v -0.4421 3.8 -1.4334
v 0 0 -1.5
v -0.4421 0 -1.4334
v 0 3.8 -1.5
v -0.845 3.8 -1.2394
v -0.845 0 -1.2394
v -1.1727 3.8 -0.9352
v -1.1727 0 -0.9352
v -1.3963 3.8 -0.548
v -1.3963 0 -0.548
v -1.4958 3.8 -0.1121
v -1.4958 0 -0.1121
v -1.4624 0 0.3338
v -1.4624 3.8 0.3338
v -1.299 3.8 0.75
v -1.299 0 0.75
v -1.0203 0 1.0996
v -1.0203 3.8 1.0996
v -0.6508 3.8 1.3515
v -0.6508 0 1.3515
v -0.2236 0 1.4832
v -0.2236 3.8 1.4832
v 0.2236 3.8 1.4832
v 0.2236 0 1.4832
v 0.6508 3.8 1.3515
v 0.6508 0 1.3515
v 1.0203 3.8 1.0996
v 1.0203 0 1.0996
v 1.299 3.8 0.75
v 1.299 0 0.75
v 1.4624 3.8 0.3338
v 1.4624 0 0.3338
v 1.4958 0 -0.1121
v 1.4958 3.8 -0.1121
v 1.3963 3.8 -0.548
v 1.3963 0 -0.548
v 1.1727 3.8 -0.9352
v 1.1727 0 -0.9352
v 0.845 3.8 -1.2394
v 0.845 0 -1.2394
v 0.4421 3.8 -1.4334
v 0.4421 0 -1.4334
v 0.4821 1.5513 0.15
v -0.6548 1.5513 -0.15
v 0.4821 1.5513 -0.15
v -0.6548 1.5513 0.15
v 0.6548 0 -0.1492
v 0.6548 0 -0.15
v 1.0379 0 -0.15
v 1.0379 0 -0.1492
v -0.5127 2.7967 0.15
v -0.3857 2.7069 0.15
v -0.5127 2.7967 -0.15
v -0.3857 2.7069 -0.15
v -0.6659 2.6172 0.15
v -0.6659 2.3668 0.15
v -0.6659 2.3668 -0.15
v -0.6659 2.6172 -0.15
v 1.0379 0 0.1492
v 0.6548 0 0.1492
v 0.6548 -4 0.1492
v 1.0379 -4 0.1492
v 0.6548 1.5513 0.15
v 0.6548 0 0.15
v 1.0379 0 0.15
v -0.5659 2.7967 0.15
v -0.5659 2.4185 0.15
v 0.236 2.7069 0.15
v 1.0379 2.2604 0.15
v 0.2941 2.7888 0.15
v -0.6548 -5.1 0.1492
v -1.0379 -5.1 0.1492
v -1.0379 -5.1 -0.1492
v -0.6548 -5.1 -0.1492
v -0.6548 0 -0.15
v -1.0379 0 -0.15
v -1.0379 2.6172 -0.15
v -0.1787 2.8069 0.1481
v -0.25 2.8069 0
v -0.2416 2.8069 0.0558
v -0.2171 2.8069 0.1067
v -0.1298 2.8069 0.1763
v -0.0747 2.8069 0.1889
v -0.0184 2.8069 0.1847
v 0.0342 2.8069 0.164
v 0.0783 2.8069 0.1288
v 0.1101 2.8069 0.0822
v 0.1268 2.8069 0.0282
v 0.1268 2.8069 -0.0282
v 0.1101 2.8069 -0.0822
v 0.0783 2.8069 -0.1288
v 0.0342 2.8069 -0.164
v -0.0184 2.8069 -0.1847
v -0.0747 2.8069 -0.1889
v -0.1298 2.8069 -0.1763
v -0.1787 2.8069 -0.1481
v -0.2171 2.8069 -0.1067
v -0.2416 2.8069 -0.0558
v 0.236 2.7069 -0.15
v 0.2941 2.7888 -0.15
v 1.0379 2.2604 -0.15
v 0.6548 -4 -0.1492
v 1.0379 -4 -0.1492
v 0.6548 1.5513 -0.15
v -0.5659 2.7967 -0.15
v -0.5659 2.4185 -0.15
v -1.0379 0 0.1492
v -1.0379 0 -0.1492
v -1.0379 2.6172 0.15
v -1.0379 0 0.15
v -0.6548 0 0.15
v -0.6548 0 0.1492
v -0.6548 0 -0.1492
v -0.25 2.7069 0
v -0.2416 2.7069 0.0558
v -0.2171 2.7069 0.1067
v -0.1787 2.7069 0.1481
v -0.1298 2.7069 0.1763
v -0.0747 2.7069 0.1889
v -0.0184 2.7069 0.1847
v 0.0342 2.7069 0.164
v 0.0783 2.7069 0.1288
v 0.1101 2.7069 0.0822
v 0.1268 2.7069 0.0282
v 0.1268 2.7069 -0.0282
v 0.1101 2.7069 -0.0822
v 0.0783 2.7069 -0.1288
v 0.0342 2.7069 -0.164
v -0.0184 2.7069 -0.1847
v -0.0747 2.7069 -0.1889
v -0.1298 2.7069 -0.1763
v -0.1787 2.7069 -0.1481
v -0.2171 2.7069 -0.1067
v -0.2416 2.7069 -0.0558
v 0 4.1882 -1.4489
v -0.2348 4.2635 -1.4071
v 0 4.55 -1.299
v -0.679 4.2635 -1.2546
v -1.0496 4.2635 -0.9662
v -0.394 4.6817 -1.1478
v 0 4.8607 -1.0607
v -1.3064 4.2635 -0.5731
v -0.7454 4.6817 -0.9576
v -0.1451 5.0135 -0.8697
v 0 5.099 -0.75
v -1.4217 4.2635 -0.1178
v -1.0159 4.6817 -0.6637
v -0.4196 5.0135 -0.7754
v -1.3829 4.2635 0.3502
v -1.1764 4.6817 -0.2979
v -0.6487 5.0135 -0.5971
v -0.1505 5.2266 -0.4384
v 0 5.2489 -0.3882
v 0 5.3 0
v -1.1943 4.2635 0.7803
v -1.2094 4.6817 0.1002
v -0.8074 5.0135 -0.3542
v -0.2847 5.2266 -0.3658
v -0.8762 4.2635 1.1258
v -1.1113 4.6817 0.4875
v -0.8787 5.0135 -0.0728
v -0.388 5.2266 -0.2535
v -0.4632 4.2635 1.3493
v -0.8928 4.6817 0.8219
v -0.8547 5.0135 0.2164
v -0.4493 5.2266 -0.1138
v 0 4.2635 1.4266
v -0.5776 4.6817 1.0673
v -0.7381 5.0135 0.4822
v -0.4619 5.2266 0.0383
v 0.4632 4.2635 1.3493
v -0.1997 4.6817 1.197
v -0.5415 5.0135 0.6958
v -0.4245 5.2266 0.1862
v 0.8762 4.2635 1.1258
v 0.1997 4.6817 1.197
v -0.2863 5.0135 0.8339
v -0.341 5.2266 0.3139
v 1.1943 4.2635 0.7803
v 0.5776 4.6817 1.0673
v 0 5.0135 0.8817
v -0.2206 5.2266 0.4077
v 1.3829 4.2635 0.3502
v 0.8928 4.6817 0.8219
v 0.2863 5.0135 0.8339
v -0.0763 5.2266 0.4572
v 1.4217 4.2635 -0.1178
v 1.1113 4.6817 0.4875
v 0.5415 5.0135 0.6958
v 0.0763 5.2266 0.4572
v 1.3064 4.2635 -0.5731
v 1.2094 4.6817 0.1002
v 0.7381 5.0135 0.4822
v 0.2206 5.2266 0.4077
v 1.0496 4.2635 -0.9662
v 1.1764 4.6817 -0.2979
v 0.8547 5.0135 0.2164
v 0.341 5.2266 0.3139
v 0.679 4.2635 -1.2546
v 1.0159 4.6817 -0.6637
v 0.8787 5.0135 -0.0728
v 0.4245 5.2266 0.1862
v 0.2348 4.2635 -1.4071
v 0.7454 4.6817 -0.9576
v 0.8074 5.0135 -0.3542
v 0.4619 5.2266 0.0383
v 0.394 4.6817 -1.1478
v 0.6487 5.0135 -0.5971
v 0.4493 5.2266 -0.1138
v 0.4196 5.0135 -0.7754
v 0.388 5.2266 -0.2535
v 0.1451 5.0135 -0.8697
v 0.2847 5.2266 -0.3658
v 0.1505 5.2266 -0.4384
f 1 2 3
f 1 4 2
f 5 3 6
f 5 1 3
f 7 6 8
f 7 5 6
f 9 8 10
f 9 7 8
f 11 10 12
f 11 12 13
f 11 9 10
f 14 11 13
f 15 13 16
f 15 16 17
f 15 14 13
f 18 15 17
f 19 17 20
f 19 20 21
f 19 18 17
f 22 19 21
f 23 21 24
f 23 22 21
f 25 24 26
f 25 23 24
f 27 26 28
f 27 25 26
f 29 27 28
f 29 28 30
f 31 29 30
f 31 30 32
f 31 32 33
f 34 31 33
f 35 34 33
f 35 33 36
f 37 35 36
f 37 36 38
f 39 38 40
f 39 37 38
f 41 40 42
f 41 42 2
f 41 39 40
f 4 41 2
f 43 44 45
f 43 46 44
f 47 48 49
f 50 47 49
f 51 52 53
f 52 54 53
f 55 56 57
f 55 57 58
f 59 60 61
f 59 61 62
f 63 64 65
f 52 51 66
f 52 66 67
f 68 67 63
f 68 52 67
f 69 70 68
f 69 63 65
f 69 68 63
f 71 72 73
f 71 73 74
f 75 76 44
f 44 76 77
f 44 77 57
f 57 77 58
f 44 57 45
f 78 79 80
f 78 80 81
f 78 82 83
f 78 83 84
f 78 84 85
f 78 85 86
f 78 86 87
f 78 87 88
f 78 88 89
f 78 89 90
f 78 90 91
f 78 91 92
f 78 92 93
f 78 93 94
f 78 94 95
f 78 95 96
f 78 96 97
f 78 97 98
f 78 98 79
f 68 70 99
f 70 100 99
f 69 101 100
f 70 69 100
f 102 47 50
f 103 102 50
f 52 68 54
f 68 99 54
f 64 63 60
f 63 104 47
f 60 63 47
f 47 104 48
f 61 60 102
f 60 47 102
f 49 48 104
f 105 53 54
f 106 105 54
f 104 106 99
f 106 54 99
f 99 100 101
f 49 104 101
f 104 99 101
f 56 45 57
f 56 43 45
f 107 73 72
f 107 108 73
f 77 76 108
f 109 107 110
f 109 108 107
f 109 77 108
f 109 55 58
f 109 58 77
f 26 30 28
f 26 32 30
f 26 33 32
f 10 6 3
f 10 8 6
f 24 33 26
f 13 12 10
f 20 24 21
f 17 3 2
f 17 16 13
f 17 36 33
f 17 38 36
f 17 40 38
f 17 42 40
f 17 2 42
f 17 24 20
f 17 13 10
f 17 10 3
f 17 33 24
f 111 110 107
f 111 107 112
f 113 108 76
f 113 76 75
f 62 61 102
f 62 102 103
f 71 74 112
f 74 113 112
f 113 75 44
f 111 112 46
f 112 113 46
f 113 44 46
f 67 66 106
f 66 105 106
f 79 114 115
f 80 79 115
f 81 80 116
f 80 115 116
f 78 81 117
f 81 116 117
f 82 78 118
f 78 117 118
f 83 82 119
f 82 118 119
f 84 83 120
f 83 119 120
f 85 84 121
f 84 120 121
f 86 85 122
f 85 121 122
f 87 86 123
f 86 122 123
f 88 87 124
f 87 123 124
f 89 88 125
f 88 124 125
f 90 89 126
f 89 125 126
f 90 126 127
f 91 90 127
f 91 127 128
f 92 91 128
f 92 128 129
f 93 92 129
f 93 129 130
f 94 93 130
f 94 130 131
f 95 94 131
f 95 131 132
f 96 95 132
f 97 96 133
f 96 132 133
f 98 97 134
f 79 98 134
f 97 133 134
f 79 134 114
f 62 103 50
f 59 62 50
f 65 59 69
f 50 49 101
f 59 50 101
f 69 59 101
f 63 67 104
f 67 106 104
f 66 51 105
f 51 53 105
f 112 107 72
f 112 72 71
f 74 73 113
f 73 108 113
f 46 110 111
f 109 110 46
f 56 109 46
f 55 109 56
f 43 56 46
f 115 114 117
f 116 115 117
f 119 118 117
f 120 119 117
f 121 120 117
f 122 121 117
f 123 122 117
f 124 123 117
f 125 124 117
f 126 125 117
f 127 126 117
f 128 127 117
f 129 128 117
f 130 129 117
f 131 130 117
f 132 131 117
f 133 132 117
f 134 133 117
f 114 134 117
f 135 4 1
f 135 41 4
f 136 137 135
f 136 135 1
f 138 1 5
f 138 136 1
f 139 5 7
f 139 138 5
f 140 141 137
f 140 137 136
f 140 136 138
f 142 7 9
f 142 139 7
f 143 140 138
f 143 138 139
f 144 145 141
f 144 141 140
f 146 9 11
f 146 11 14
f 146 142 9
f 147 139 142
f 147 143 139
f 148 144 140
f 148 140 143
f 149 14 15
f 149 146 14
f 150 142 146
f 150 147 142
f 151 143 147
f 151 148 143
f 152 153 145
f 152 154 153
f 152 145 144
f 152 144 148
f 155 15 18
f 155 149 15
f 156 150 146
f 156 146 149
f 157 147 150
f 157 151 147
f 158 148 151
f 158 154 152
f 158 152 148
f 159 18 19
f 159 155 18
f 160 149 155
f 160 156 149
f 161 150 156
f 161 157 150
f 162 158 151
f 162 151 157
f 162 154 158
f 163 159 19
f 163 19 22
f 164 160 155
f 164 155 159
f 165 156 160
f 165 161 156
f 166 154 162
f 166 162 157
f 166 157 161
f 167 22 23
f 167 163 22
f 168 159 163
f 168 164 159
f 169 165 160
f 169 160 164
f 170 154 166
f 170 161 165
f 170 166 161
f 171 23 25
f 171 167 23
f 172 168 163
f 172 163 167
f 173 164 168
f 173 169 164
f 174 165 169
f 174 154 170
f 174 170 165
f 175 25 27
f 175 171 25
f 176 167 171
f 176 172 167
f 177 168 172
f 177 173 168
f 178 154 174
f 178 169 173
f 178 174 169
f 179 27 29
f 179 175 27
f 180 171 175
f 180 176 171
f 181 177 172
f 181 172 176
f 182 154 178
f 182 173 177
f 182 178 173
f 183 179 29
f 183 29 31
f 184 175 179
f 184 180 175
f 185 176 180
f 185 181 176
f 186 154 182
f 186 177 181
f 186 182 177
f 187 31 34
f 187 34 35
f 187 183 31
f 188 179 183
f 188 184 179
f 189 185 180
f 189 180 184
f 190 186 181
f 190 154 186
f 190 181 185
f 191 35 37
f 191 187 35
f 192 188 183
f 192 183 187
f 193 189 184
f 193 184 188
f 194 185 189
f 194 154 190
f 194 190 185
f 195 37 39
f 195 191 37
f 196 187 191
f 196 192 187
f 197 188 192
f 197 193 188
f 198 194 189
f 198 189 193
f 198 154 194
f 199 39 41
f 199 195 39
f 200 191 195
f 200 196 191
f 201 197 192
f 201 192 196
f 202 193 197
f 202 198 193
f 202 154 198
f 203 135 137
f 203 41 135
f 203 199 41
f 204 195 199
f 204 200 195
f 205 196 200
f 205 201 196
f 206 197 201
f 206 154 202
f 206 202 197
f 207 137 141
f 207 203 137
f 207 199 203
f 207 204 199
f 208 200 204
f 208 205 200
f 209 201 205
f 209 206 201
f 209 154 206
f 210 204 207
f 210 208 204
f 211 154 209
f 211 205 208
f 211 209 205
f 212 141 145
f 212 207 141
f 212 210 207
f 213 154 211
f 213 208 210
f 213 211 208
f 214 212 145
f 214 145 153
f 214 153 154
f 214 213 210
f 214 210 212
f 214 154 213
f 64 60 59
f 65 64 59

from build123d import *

# Parameters (mm, degrees)
SKETCH3_W             = 0.383062026
SKETCH3_H             = 0.298484562
BOSS_EXTRUDE1_DEPTH   = 4
BOSS_EXTRUDE1_2_DEPTH = 4
BOSS_EXTRUDE2_DEPTH   = 0.15
SKETCH5_R             = 0.189425794
BOSS_EXTRUDE3_DEPTH   = 0.1
SKETCH7_W             = 0.383062026
SKETCH7_H             = 0.298484562
BOSS_EXTRUDE5_DEPTH   = 1.1


with BuildPart() as part:
    # Sketch1 → Revolve1 (revolve)
    with BuildSketch(Plane.XY, mode=Mode.PRIVATE) as revolve1_sk:
        with BuildLine():
            Line((0, 0), (-1.5, 0))
            Line((-1.5, 0), (-1.5, 3.8))
            ThreePointArc((-1.5, 3.8), (-1.060660172, 4.860660172), (0, 5.3))
            Line((0, 5.3), (0, 0))
        make_face()
    revolve(revolve1_sk.sketch.rotate(Axis((0, 0, 0), (0, 1, 0)), 270), axis=Axis((0, 0, 0), (0, 1, 0)))


with BuildPart() as body_2:
    # Sketch3 → Boss-Extrude1 (new body)
    with BuildSketch(Plane.XZ):
        with Locations((-0.846347528, 0)):
            Rectangle(SKETCH3_W, SKETCH3_H)
    extrude(amount=BOSS_EXTRUDE1_DEPTH)


with BuildPart() as body_3:
    # Sketch3 → Boss-Extrude1 2 (new body)
    with BuildSketch(Plane.XZ):
        with Locations((0.846347528, 0)):
            Rectangle(SKETCH3_W, SKETCH3_H)
    extrude(amount=BOSS_EXTRUDE1_2_DEPTH)


    add(body_2.part)  # Boss-Extrude2 merges body 2
    # Sketch4 → Boss-Extrude2 (add, symmetric)
    with BuildSketch(Plane.XY):
        Polygon((1.037878541, 2.260445566), (0.294117621, 2.788795467), (0.235969658, 2.706940276), (-0.385685641, 2.706940276), (-0.512741887, 2.796720697), (-0.565939225, 2.796720697), (-0.565939225, 2.617159855), (-0.565939225, 2.418450997), (0.654816515, 1.551255429), (0.654816515, 0), (1.037878541, 0), (1.037878541, 1.551255429), align=None)
        Polygon((0.482142428, 1.551255429), (-0.665939225, 2.366825071), (-0.665939225, 2.617159855), (-1.037878541, 2.617159855), (-1.037878541, 1.551255429), (-1.037878541, 0), (-0.654816515, 0), (-0.654816515, 1.551255429), align=None)
    extrude(amount=BOSS_EXTRUDE2_DEPTH, both=True)

    # Sketch7 → Boss-Extrude5 (add)
    with BuildSketch(Plane.XZ.offset(4)):
        with Locations((-0.846347528, 0)):
            Rectangle(SKETCH7_W, SKETCH7_H)
    extrude(amount=BOSS_EXTRUDE5_DEPTH)


with BuildPart() as body_3_2:
    # Sketch5 → Boss-Extrude3 (new body)
    with BuildSketch(Plane(origin=(0, 2.706940276, 0), x_dir=(1, 0, 0), z_dir=(0, 1, 0))):
        with Locations(Location((-0.060559566, 0, 0), (0, 0, 180))):
            Circle(SKETCH5_R)
    extrude(amount=BOSS_EXTRUDE3_DEPTH)


solid = Compound([part.part, body_3.part, body_3_2.part])
